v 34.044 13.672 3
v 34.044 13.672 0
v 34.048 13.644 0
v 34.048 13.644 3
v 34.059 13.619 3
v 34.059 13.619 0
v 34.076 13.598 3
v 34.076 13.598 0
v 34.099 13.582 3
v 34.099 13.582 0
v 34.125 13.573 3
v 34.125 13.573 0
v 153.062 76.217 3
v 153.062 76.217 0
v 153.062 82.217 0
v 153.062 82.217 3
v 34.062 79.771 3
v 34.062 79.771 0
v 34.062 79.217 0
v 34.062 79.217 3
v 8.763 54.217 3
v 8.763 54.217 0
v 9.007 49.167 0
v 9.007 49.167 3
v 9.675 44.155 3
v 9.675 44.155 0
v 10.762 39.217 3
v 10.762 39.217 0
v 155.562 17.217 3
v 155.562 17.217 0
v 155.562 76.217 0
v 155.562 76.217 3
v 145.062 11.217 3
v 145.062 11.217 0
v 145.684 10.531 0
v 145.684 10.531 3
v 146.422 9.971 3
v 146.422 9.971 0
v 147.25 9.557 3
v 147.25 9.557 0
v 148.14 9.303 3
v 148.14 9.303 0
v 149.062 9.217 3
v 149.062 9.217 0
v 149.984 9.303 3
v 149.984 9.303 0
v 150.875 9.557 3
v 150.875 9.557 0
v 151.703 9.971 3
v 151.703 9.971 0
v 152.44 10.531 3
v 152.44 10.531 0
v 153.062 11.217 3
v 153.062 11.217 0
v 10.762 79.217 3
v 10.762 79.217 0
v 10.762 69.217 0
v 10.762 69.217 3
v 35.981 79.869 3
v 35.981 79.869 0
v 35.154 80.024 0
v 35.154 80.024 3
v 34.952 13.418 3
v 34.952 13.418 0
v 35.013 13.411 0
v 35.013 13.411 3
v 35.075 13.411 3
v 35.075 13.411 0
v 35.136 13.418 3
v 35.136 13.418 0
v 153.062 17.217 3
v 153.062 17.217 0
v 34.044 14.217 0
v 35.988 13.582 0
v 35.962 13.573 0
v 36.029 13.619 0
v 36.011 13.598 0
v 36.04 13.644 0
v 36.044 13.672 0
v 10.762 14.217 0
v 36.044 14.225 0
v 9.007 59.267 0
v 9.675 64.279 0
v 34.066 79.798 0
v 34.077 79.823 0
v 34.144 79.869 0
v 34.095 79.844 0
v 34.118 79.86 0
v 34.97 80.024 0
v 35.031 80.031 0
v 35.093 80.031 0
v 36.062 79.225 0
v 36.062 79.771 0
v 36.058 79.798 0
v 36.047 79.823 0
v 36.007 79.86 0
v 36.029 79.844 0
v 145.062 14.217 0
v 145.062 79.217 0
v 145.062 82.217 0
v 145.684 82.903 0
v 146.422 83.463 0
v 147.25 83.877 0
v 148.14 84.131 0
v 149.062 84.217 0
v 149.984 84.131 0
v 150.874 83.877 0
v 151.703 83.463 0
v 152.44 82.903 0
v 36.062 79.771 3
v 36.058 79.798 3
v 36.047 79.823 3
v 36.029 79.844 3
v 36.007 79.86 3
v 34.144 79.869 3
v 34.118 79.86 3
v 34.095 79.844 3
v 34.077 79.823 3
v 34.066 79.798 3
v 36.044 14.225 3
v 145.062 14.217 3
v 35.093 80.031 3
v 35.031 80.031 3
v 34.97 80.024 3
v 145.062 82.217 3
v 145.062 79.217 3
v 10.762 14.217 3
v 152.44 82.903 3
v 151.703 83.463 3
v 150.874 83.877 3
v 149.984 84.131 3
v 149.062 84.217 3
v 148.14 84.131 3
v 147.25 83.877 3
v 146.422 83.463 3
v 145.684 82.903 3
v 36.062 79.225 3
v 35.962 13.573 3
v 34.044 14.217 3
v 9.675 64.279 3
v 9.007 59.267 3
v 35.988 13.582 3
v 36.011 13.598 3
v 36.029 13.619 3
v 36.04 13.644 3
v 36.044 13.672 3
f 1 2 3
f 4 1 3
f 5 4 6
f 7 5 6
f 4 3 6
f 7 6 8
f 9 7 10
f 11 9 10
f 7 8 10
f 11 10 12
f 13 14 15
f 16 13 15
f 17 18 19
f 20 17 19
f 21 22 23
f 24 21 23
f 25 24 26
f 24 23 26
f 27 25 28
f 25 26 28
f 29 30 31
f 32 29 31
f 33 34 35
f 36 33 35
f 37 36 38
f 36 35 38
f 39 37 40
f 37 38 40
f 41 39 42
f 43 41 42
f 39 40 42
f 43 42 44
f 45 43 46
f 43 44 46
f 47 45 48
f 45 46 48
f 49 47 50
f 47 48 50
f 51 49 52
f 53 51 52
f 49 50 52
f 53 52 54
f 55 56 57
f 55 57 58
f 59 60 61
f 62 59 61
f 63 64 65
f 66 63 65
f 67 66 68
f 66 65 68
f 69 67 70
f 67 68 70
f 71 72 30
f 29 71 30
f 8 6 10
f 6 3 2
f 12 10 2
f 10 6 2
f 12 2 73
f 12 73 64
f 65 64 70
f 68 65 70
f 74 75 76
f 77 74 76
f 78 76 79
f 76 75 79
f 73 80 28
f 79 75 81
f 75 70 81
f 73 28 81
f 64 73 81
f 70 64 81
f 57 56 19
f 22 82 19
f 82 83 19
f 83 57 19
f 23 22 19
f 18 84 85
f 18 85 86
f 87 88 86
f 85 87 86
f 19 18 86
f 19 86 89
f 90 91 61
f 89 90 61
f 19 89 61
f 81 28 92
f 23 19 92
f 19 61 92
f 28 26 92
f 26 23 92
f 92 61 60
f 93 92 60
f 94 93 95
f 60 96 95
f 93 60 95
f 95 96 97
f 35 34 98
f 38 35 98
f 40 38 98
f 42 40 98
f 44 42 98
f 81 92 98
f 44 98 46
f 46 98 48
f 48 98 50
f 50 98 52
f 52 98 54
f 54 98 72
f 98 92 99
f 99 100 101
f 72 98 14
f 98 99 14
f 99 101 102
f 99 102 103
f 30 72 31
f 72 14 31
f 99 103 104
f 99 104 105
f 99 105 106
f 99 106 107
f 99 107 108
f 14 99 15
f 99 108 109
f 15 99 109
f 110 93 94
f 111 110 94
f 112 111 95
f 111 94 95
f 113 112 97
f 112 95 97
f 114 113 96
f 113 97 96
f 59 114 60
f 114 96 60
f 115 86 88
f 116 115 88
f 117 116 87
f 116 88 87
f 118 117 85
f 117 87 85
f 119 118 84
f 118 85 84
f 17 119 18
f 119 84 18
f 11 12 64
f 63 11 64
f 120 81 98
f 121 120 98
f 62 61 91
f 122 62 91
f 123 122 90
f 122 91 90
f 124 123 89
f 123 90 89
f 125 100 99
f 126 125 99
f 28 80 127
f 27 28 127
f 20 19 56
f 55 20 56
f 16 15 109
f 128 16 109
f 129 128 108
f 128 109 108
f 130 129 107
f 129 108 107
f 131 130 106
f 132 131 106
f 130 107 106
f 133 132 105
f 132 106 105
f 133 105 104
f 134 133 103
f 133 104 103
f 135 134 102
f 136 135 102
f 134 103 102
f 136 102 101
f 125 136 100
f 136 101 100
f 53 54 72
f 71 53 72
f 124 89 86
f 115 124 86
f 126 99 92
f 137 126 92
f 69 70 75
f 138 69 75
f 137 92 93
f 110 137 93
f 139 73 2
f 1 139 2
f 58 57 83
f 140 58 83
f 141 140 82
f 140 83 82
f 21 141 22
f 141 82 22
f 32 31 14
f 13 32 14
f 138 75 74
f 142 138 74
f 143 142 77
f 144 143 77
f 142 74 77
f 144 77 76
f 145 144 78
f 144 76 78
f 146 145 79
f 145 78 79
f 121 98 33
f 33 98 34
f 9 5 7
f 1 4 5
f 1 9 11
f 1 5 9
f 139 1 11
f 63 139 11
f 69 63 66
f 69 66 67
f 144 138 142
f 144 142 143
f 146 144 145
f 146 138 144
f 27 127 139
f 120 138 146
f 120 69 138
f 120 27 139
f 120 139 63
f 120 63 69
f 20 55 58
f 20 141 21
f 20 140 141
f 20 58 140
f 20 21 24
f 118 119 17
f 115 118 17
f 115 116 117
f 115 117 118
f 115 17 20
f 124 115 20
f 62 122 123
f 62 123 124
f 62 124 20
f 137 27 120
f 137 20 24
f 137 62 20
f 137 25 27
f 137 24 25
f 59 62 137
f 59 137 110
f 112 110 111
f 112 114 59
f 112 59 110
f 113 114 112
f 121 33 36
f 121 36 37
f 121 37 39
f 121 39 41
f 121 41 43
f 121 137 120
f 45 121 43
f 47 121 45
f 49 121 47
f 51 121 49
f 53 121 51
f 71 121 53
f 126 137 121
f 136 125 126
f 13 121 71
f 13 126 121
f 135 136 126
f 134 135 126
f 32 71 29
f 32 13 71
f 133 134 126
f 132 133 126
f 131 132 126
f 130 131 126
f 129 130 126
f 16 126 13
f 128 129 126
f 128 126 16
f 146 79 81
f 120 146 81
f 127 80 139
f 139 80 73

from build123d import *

# Parameters (mm, degrees)
SALIENTE_EXTRUIR1_DEPTH = 3
CROQUIS8_W              = 3
CROQUIS8_H              = 64.999858303
CORTAR_EXTRUIR2_DEPTH   = 0.7
CROQUIS10_W             = 2
CROQUIS10_H             = 30
SALIENTE_EXTRUIR3_DEPTH = 3
REDONDEO2_R             = 60


with BuildPart() as part:
    # Croquis1 → Saliente-Extruir1 (new body)
    with BuildSketch(Plane.XY):
        with BuildLine():
            Line((153.062162769, 17.216958542), (155.56216277, 17.216958542))
            Line((155.56216277, 17.216958542), (155.56216277, 76.216816844))
            Line((155.56216277, 76.216816844), (153.062162769, 76.216816844))
            Line((153.062162769, 76.216816844), (153.062162769, 82.216816846))
            ThreePointArc((153.062162769, 82.216816846), (149.062162768, 84.216694386), (145.062162767, 82.216816846))
            Line((145.062162767, 82.216816846), (145.062162767, 79.216816845))
            Line((145.062162767, 79.216816845), (36.062088373, 79.225159863))
            Line((36.062088373, 79.225159863), (36.062088373, 79.770603401))
            ThreePointArc((36.062088373, 79.770603401), (36.039039485, 79.834466742), (35.980517846, 79.868890504))
            Line((35.980517846, 79.868890504), (35.154268939, 80.023817566))
            ThreePointArc((35.154268939, 80.023817566), (35.062123149, 80.032382053), (34.969977306, 80.023818147))
            Line((34.969977306, 80.023818147), (34.143694323, 79.868890087))
            ThreePointArc((34.143694323, 79.868890087), (34.085172266, 79.834466452), (34.062123176, 79.770602869))
            Line((34.062123176, 79.770602869), (34.062123176, 79.216816845))
            Line((34.062123176, 79.216816845), (10.06212317, 79.216816845))
            Line((10.06212317, 79.216816845), (10.06212317, 14.216958542))
            Line((10.06212317, 14.216958542), (34.043728806, 14.216958542))
            Line((34.043728806, 14.216958542), (34.043728806, 13.671515004))
            ThreePointArc((34.043728806, 13.671515004), (34.066777694, 13.607651663), (34.125299333, 13.573227901))
            Line((34.125299333, 13.573227901), (34.95154824, 13.418300839))
            ThreePointArc((34.95154824, 13.418300839), (35.04369403, 13.409736352), (35.135839873, 13.418300258))
            Line((35.135839873, 13.418300258), (35.962122856, 13.573228317))
            ThreePointArc((35.962122856, 13.573228317), (36.020644913, 13.607651952), (36.043694003, 13.671515536))
            Line((36.043694003, 13.671515536), (36.043694003, 14.22530156))
            Line((36.043694003, 14.22530156), (145.062162767, 14.216958542))
            Line((145.062162767, 14.216958542), (145.062162767, 11.216958541))
            ThreePointArc((145.062162767, 11.216958541), (149.062162768, 9.21695854), (153.062162769, 11.216958541))
            Line((153.062162769, 11.216958541), (153.062162769, 17.216958542))
        make_face()
    extrude(amount=SALIENTE_EXTRUIR1_DEPTH)

    # Croquis8 → Cortar-Extruir2 (cut)
    with BuildSketch(Plane.ZY.offset(-10.06212317)):
        with Locations((1.5, 46.716887694)):
            Rectangle(CROQUIS8_W, CROQUIS8_H)
    extrude(amount=-CORTAR_EXTRUIR2_DEPTH, mode=Mode.SUBTRACT)

    # Croquis10 → Saliente-Extruir3 (add)
    with BuildSketch(Plane(origin=(0, 0, 0), x_dir=(-1, 0, 0), z_dir=(0, 0, -1))):
        with Locations((-9.76212317, 54.216816845)):
            Rectangle(CROQUIS10_W, CROQUIS10_H)
    extrude(amount=-SALIENTE_EXTRUIR3_DEPTH)

    # Redondeo2
    # the kernel refuses this fillet: 60 mm, written as the material it takes off along each edge
    with BuildSketch(Plane(origin=(8.76212317, 69.216816845, -38.405728739), x_dir=(1, 0, 0), z_dir=(0, 0, 1))) as redondeo2_piece_1:
        with BuildLine():
            CenterArc((60, -15.362291496), REDONDEO2_R, 165.164888418, 14.835111582)
            Line((0, -15.362291496), (0, 0))
            Line((0, 0), (2, 0))
        make_face()
    extrude(amount=79.811457479, mode=Mode.SUBTRACT)
    with BuildSketch(Plane(origin=(8.76212317, 39.216816845, -38.405728739), x_dir=(0, 1, 0), z_dir=(0, 0, 1))) as redondeo2_piece_2:
        with BuildLine():
            CenterArc((15.362291496, -60), REDONDEO2_R, 90, 14.835111582)
            Line((0, -2), (0, 0))
            Line((0, 0), (15.362291496, 0))
        make_face()
    extrude(amount=79.811457479, mode=Mode.SUBTRACT)


solid = part.part
